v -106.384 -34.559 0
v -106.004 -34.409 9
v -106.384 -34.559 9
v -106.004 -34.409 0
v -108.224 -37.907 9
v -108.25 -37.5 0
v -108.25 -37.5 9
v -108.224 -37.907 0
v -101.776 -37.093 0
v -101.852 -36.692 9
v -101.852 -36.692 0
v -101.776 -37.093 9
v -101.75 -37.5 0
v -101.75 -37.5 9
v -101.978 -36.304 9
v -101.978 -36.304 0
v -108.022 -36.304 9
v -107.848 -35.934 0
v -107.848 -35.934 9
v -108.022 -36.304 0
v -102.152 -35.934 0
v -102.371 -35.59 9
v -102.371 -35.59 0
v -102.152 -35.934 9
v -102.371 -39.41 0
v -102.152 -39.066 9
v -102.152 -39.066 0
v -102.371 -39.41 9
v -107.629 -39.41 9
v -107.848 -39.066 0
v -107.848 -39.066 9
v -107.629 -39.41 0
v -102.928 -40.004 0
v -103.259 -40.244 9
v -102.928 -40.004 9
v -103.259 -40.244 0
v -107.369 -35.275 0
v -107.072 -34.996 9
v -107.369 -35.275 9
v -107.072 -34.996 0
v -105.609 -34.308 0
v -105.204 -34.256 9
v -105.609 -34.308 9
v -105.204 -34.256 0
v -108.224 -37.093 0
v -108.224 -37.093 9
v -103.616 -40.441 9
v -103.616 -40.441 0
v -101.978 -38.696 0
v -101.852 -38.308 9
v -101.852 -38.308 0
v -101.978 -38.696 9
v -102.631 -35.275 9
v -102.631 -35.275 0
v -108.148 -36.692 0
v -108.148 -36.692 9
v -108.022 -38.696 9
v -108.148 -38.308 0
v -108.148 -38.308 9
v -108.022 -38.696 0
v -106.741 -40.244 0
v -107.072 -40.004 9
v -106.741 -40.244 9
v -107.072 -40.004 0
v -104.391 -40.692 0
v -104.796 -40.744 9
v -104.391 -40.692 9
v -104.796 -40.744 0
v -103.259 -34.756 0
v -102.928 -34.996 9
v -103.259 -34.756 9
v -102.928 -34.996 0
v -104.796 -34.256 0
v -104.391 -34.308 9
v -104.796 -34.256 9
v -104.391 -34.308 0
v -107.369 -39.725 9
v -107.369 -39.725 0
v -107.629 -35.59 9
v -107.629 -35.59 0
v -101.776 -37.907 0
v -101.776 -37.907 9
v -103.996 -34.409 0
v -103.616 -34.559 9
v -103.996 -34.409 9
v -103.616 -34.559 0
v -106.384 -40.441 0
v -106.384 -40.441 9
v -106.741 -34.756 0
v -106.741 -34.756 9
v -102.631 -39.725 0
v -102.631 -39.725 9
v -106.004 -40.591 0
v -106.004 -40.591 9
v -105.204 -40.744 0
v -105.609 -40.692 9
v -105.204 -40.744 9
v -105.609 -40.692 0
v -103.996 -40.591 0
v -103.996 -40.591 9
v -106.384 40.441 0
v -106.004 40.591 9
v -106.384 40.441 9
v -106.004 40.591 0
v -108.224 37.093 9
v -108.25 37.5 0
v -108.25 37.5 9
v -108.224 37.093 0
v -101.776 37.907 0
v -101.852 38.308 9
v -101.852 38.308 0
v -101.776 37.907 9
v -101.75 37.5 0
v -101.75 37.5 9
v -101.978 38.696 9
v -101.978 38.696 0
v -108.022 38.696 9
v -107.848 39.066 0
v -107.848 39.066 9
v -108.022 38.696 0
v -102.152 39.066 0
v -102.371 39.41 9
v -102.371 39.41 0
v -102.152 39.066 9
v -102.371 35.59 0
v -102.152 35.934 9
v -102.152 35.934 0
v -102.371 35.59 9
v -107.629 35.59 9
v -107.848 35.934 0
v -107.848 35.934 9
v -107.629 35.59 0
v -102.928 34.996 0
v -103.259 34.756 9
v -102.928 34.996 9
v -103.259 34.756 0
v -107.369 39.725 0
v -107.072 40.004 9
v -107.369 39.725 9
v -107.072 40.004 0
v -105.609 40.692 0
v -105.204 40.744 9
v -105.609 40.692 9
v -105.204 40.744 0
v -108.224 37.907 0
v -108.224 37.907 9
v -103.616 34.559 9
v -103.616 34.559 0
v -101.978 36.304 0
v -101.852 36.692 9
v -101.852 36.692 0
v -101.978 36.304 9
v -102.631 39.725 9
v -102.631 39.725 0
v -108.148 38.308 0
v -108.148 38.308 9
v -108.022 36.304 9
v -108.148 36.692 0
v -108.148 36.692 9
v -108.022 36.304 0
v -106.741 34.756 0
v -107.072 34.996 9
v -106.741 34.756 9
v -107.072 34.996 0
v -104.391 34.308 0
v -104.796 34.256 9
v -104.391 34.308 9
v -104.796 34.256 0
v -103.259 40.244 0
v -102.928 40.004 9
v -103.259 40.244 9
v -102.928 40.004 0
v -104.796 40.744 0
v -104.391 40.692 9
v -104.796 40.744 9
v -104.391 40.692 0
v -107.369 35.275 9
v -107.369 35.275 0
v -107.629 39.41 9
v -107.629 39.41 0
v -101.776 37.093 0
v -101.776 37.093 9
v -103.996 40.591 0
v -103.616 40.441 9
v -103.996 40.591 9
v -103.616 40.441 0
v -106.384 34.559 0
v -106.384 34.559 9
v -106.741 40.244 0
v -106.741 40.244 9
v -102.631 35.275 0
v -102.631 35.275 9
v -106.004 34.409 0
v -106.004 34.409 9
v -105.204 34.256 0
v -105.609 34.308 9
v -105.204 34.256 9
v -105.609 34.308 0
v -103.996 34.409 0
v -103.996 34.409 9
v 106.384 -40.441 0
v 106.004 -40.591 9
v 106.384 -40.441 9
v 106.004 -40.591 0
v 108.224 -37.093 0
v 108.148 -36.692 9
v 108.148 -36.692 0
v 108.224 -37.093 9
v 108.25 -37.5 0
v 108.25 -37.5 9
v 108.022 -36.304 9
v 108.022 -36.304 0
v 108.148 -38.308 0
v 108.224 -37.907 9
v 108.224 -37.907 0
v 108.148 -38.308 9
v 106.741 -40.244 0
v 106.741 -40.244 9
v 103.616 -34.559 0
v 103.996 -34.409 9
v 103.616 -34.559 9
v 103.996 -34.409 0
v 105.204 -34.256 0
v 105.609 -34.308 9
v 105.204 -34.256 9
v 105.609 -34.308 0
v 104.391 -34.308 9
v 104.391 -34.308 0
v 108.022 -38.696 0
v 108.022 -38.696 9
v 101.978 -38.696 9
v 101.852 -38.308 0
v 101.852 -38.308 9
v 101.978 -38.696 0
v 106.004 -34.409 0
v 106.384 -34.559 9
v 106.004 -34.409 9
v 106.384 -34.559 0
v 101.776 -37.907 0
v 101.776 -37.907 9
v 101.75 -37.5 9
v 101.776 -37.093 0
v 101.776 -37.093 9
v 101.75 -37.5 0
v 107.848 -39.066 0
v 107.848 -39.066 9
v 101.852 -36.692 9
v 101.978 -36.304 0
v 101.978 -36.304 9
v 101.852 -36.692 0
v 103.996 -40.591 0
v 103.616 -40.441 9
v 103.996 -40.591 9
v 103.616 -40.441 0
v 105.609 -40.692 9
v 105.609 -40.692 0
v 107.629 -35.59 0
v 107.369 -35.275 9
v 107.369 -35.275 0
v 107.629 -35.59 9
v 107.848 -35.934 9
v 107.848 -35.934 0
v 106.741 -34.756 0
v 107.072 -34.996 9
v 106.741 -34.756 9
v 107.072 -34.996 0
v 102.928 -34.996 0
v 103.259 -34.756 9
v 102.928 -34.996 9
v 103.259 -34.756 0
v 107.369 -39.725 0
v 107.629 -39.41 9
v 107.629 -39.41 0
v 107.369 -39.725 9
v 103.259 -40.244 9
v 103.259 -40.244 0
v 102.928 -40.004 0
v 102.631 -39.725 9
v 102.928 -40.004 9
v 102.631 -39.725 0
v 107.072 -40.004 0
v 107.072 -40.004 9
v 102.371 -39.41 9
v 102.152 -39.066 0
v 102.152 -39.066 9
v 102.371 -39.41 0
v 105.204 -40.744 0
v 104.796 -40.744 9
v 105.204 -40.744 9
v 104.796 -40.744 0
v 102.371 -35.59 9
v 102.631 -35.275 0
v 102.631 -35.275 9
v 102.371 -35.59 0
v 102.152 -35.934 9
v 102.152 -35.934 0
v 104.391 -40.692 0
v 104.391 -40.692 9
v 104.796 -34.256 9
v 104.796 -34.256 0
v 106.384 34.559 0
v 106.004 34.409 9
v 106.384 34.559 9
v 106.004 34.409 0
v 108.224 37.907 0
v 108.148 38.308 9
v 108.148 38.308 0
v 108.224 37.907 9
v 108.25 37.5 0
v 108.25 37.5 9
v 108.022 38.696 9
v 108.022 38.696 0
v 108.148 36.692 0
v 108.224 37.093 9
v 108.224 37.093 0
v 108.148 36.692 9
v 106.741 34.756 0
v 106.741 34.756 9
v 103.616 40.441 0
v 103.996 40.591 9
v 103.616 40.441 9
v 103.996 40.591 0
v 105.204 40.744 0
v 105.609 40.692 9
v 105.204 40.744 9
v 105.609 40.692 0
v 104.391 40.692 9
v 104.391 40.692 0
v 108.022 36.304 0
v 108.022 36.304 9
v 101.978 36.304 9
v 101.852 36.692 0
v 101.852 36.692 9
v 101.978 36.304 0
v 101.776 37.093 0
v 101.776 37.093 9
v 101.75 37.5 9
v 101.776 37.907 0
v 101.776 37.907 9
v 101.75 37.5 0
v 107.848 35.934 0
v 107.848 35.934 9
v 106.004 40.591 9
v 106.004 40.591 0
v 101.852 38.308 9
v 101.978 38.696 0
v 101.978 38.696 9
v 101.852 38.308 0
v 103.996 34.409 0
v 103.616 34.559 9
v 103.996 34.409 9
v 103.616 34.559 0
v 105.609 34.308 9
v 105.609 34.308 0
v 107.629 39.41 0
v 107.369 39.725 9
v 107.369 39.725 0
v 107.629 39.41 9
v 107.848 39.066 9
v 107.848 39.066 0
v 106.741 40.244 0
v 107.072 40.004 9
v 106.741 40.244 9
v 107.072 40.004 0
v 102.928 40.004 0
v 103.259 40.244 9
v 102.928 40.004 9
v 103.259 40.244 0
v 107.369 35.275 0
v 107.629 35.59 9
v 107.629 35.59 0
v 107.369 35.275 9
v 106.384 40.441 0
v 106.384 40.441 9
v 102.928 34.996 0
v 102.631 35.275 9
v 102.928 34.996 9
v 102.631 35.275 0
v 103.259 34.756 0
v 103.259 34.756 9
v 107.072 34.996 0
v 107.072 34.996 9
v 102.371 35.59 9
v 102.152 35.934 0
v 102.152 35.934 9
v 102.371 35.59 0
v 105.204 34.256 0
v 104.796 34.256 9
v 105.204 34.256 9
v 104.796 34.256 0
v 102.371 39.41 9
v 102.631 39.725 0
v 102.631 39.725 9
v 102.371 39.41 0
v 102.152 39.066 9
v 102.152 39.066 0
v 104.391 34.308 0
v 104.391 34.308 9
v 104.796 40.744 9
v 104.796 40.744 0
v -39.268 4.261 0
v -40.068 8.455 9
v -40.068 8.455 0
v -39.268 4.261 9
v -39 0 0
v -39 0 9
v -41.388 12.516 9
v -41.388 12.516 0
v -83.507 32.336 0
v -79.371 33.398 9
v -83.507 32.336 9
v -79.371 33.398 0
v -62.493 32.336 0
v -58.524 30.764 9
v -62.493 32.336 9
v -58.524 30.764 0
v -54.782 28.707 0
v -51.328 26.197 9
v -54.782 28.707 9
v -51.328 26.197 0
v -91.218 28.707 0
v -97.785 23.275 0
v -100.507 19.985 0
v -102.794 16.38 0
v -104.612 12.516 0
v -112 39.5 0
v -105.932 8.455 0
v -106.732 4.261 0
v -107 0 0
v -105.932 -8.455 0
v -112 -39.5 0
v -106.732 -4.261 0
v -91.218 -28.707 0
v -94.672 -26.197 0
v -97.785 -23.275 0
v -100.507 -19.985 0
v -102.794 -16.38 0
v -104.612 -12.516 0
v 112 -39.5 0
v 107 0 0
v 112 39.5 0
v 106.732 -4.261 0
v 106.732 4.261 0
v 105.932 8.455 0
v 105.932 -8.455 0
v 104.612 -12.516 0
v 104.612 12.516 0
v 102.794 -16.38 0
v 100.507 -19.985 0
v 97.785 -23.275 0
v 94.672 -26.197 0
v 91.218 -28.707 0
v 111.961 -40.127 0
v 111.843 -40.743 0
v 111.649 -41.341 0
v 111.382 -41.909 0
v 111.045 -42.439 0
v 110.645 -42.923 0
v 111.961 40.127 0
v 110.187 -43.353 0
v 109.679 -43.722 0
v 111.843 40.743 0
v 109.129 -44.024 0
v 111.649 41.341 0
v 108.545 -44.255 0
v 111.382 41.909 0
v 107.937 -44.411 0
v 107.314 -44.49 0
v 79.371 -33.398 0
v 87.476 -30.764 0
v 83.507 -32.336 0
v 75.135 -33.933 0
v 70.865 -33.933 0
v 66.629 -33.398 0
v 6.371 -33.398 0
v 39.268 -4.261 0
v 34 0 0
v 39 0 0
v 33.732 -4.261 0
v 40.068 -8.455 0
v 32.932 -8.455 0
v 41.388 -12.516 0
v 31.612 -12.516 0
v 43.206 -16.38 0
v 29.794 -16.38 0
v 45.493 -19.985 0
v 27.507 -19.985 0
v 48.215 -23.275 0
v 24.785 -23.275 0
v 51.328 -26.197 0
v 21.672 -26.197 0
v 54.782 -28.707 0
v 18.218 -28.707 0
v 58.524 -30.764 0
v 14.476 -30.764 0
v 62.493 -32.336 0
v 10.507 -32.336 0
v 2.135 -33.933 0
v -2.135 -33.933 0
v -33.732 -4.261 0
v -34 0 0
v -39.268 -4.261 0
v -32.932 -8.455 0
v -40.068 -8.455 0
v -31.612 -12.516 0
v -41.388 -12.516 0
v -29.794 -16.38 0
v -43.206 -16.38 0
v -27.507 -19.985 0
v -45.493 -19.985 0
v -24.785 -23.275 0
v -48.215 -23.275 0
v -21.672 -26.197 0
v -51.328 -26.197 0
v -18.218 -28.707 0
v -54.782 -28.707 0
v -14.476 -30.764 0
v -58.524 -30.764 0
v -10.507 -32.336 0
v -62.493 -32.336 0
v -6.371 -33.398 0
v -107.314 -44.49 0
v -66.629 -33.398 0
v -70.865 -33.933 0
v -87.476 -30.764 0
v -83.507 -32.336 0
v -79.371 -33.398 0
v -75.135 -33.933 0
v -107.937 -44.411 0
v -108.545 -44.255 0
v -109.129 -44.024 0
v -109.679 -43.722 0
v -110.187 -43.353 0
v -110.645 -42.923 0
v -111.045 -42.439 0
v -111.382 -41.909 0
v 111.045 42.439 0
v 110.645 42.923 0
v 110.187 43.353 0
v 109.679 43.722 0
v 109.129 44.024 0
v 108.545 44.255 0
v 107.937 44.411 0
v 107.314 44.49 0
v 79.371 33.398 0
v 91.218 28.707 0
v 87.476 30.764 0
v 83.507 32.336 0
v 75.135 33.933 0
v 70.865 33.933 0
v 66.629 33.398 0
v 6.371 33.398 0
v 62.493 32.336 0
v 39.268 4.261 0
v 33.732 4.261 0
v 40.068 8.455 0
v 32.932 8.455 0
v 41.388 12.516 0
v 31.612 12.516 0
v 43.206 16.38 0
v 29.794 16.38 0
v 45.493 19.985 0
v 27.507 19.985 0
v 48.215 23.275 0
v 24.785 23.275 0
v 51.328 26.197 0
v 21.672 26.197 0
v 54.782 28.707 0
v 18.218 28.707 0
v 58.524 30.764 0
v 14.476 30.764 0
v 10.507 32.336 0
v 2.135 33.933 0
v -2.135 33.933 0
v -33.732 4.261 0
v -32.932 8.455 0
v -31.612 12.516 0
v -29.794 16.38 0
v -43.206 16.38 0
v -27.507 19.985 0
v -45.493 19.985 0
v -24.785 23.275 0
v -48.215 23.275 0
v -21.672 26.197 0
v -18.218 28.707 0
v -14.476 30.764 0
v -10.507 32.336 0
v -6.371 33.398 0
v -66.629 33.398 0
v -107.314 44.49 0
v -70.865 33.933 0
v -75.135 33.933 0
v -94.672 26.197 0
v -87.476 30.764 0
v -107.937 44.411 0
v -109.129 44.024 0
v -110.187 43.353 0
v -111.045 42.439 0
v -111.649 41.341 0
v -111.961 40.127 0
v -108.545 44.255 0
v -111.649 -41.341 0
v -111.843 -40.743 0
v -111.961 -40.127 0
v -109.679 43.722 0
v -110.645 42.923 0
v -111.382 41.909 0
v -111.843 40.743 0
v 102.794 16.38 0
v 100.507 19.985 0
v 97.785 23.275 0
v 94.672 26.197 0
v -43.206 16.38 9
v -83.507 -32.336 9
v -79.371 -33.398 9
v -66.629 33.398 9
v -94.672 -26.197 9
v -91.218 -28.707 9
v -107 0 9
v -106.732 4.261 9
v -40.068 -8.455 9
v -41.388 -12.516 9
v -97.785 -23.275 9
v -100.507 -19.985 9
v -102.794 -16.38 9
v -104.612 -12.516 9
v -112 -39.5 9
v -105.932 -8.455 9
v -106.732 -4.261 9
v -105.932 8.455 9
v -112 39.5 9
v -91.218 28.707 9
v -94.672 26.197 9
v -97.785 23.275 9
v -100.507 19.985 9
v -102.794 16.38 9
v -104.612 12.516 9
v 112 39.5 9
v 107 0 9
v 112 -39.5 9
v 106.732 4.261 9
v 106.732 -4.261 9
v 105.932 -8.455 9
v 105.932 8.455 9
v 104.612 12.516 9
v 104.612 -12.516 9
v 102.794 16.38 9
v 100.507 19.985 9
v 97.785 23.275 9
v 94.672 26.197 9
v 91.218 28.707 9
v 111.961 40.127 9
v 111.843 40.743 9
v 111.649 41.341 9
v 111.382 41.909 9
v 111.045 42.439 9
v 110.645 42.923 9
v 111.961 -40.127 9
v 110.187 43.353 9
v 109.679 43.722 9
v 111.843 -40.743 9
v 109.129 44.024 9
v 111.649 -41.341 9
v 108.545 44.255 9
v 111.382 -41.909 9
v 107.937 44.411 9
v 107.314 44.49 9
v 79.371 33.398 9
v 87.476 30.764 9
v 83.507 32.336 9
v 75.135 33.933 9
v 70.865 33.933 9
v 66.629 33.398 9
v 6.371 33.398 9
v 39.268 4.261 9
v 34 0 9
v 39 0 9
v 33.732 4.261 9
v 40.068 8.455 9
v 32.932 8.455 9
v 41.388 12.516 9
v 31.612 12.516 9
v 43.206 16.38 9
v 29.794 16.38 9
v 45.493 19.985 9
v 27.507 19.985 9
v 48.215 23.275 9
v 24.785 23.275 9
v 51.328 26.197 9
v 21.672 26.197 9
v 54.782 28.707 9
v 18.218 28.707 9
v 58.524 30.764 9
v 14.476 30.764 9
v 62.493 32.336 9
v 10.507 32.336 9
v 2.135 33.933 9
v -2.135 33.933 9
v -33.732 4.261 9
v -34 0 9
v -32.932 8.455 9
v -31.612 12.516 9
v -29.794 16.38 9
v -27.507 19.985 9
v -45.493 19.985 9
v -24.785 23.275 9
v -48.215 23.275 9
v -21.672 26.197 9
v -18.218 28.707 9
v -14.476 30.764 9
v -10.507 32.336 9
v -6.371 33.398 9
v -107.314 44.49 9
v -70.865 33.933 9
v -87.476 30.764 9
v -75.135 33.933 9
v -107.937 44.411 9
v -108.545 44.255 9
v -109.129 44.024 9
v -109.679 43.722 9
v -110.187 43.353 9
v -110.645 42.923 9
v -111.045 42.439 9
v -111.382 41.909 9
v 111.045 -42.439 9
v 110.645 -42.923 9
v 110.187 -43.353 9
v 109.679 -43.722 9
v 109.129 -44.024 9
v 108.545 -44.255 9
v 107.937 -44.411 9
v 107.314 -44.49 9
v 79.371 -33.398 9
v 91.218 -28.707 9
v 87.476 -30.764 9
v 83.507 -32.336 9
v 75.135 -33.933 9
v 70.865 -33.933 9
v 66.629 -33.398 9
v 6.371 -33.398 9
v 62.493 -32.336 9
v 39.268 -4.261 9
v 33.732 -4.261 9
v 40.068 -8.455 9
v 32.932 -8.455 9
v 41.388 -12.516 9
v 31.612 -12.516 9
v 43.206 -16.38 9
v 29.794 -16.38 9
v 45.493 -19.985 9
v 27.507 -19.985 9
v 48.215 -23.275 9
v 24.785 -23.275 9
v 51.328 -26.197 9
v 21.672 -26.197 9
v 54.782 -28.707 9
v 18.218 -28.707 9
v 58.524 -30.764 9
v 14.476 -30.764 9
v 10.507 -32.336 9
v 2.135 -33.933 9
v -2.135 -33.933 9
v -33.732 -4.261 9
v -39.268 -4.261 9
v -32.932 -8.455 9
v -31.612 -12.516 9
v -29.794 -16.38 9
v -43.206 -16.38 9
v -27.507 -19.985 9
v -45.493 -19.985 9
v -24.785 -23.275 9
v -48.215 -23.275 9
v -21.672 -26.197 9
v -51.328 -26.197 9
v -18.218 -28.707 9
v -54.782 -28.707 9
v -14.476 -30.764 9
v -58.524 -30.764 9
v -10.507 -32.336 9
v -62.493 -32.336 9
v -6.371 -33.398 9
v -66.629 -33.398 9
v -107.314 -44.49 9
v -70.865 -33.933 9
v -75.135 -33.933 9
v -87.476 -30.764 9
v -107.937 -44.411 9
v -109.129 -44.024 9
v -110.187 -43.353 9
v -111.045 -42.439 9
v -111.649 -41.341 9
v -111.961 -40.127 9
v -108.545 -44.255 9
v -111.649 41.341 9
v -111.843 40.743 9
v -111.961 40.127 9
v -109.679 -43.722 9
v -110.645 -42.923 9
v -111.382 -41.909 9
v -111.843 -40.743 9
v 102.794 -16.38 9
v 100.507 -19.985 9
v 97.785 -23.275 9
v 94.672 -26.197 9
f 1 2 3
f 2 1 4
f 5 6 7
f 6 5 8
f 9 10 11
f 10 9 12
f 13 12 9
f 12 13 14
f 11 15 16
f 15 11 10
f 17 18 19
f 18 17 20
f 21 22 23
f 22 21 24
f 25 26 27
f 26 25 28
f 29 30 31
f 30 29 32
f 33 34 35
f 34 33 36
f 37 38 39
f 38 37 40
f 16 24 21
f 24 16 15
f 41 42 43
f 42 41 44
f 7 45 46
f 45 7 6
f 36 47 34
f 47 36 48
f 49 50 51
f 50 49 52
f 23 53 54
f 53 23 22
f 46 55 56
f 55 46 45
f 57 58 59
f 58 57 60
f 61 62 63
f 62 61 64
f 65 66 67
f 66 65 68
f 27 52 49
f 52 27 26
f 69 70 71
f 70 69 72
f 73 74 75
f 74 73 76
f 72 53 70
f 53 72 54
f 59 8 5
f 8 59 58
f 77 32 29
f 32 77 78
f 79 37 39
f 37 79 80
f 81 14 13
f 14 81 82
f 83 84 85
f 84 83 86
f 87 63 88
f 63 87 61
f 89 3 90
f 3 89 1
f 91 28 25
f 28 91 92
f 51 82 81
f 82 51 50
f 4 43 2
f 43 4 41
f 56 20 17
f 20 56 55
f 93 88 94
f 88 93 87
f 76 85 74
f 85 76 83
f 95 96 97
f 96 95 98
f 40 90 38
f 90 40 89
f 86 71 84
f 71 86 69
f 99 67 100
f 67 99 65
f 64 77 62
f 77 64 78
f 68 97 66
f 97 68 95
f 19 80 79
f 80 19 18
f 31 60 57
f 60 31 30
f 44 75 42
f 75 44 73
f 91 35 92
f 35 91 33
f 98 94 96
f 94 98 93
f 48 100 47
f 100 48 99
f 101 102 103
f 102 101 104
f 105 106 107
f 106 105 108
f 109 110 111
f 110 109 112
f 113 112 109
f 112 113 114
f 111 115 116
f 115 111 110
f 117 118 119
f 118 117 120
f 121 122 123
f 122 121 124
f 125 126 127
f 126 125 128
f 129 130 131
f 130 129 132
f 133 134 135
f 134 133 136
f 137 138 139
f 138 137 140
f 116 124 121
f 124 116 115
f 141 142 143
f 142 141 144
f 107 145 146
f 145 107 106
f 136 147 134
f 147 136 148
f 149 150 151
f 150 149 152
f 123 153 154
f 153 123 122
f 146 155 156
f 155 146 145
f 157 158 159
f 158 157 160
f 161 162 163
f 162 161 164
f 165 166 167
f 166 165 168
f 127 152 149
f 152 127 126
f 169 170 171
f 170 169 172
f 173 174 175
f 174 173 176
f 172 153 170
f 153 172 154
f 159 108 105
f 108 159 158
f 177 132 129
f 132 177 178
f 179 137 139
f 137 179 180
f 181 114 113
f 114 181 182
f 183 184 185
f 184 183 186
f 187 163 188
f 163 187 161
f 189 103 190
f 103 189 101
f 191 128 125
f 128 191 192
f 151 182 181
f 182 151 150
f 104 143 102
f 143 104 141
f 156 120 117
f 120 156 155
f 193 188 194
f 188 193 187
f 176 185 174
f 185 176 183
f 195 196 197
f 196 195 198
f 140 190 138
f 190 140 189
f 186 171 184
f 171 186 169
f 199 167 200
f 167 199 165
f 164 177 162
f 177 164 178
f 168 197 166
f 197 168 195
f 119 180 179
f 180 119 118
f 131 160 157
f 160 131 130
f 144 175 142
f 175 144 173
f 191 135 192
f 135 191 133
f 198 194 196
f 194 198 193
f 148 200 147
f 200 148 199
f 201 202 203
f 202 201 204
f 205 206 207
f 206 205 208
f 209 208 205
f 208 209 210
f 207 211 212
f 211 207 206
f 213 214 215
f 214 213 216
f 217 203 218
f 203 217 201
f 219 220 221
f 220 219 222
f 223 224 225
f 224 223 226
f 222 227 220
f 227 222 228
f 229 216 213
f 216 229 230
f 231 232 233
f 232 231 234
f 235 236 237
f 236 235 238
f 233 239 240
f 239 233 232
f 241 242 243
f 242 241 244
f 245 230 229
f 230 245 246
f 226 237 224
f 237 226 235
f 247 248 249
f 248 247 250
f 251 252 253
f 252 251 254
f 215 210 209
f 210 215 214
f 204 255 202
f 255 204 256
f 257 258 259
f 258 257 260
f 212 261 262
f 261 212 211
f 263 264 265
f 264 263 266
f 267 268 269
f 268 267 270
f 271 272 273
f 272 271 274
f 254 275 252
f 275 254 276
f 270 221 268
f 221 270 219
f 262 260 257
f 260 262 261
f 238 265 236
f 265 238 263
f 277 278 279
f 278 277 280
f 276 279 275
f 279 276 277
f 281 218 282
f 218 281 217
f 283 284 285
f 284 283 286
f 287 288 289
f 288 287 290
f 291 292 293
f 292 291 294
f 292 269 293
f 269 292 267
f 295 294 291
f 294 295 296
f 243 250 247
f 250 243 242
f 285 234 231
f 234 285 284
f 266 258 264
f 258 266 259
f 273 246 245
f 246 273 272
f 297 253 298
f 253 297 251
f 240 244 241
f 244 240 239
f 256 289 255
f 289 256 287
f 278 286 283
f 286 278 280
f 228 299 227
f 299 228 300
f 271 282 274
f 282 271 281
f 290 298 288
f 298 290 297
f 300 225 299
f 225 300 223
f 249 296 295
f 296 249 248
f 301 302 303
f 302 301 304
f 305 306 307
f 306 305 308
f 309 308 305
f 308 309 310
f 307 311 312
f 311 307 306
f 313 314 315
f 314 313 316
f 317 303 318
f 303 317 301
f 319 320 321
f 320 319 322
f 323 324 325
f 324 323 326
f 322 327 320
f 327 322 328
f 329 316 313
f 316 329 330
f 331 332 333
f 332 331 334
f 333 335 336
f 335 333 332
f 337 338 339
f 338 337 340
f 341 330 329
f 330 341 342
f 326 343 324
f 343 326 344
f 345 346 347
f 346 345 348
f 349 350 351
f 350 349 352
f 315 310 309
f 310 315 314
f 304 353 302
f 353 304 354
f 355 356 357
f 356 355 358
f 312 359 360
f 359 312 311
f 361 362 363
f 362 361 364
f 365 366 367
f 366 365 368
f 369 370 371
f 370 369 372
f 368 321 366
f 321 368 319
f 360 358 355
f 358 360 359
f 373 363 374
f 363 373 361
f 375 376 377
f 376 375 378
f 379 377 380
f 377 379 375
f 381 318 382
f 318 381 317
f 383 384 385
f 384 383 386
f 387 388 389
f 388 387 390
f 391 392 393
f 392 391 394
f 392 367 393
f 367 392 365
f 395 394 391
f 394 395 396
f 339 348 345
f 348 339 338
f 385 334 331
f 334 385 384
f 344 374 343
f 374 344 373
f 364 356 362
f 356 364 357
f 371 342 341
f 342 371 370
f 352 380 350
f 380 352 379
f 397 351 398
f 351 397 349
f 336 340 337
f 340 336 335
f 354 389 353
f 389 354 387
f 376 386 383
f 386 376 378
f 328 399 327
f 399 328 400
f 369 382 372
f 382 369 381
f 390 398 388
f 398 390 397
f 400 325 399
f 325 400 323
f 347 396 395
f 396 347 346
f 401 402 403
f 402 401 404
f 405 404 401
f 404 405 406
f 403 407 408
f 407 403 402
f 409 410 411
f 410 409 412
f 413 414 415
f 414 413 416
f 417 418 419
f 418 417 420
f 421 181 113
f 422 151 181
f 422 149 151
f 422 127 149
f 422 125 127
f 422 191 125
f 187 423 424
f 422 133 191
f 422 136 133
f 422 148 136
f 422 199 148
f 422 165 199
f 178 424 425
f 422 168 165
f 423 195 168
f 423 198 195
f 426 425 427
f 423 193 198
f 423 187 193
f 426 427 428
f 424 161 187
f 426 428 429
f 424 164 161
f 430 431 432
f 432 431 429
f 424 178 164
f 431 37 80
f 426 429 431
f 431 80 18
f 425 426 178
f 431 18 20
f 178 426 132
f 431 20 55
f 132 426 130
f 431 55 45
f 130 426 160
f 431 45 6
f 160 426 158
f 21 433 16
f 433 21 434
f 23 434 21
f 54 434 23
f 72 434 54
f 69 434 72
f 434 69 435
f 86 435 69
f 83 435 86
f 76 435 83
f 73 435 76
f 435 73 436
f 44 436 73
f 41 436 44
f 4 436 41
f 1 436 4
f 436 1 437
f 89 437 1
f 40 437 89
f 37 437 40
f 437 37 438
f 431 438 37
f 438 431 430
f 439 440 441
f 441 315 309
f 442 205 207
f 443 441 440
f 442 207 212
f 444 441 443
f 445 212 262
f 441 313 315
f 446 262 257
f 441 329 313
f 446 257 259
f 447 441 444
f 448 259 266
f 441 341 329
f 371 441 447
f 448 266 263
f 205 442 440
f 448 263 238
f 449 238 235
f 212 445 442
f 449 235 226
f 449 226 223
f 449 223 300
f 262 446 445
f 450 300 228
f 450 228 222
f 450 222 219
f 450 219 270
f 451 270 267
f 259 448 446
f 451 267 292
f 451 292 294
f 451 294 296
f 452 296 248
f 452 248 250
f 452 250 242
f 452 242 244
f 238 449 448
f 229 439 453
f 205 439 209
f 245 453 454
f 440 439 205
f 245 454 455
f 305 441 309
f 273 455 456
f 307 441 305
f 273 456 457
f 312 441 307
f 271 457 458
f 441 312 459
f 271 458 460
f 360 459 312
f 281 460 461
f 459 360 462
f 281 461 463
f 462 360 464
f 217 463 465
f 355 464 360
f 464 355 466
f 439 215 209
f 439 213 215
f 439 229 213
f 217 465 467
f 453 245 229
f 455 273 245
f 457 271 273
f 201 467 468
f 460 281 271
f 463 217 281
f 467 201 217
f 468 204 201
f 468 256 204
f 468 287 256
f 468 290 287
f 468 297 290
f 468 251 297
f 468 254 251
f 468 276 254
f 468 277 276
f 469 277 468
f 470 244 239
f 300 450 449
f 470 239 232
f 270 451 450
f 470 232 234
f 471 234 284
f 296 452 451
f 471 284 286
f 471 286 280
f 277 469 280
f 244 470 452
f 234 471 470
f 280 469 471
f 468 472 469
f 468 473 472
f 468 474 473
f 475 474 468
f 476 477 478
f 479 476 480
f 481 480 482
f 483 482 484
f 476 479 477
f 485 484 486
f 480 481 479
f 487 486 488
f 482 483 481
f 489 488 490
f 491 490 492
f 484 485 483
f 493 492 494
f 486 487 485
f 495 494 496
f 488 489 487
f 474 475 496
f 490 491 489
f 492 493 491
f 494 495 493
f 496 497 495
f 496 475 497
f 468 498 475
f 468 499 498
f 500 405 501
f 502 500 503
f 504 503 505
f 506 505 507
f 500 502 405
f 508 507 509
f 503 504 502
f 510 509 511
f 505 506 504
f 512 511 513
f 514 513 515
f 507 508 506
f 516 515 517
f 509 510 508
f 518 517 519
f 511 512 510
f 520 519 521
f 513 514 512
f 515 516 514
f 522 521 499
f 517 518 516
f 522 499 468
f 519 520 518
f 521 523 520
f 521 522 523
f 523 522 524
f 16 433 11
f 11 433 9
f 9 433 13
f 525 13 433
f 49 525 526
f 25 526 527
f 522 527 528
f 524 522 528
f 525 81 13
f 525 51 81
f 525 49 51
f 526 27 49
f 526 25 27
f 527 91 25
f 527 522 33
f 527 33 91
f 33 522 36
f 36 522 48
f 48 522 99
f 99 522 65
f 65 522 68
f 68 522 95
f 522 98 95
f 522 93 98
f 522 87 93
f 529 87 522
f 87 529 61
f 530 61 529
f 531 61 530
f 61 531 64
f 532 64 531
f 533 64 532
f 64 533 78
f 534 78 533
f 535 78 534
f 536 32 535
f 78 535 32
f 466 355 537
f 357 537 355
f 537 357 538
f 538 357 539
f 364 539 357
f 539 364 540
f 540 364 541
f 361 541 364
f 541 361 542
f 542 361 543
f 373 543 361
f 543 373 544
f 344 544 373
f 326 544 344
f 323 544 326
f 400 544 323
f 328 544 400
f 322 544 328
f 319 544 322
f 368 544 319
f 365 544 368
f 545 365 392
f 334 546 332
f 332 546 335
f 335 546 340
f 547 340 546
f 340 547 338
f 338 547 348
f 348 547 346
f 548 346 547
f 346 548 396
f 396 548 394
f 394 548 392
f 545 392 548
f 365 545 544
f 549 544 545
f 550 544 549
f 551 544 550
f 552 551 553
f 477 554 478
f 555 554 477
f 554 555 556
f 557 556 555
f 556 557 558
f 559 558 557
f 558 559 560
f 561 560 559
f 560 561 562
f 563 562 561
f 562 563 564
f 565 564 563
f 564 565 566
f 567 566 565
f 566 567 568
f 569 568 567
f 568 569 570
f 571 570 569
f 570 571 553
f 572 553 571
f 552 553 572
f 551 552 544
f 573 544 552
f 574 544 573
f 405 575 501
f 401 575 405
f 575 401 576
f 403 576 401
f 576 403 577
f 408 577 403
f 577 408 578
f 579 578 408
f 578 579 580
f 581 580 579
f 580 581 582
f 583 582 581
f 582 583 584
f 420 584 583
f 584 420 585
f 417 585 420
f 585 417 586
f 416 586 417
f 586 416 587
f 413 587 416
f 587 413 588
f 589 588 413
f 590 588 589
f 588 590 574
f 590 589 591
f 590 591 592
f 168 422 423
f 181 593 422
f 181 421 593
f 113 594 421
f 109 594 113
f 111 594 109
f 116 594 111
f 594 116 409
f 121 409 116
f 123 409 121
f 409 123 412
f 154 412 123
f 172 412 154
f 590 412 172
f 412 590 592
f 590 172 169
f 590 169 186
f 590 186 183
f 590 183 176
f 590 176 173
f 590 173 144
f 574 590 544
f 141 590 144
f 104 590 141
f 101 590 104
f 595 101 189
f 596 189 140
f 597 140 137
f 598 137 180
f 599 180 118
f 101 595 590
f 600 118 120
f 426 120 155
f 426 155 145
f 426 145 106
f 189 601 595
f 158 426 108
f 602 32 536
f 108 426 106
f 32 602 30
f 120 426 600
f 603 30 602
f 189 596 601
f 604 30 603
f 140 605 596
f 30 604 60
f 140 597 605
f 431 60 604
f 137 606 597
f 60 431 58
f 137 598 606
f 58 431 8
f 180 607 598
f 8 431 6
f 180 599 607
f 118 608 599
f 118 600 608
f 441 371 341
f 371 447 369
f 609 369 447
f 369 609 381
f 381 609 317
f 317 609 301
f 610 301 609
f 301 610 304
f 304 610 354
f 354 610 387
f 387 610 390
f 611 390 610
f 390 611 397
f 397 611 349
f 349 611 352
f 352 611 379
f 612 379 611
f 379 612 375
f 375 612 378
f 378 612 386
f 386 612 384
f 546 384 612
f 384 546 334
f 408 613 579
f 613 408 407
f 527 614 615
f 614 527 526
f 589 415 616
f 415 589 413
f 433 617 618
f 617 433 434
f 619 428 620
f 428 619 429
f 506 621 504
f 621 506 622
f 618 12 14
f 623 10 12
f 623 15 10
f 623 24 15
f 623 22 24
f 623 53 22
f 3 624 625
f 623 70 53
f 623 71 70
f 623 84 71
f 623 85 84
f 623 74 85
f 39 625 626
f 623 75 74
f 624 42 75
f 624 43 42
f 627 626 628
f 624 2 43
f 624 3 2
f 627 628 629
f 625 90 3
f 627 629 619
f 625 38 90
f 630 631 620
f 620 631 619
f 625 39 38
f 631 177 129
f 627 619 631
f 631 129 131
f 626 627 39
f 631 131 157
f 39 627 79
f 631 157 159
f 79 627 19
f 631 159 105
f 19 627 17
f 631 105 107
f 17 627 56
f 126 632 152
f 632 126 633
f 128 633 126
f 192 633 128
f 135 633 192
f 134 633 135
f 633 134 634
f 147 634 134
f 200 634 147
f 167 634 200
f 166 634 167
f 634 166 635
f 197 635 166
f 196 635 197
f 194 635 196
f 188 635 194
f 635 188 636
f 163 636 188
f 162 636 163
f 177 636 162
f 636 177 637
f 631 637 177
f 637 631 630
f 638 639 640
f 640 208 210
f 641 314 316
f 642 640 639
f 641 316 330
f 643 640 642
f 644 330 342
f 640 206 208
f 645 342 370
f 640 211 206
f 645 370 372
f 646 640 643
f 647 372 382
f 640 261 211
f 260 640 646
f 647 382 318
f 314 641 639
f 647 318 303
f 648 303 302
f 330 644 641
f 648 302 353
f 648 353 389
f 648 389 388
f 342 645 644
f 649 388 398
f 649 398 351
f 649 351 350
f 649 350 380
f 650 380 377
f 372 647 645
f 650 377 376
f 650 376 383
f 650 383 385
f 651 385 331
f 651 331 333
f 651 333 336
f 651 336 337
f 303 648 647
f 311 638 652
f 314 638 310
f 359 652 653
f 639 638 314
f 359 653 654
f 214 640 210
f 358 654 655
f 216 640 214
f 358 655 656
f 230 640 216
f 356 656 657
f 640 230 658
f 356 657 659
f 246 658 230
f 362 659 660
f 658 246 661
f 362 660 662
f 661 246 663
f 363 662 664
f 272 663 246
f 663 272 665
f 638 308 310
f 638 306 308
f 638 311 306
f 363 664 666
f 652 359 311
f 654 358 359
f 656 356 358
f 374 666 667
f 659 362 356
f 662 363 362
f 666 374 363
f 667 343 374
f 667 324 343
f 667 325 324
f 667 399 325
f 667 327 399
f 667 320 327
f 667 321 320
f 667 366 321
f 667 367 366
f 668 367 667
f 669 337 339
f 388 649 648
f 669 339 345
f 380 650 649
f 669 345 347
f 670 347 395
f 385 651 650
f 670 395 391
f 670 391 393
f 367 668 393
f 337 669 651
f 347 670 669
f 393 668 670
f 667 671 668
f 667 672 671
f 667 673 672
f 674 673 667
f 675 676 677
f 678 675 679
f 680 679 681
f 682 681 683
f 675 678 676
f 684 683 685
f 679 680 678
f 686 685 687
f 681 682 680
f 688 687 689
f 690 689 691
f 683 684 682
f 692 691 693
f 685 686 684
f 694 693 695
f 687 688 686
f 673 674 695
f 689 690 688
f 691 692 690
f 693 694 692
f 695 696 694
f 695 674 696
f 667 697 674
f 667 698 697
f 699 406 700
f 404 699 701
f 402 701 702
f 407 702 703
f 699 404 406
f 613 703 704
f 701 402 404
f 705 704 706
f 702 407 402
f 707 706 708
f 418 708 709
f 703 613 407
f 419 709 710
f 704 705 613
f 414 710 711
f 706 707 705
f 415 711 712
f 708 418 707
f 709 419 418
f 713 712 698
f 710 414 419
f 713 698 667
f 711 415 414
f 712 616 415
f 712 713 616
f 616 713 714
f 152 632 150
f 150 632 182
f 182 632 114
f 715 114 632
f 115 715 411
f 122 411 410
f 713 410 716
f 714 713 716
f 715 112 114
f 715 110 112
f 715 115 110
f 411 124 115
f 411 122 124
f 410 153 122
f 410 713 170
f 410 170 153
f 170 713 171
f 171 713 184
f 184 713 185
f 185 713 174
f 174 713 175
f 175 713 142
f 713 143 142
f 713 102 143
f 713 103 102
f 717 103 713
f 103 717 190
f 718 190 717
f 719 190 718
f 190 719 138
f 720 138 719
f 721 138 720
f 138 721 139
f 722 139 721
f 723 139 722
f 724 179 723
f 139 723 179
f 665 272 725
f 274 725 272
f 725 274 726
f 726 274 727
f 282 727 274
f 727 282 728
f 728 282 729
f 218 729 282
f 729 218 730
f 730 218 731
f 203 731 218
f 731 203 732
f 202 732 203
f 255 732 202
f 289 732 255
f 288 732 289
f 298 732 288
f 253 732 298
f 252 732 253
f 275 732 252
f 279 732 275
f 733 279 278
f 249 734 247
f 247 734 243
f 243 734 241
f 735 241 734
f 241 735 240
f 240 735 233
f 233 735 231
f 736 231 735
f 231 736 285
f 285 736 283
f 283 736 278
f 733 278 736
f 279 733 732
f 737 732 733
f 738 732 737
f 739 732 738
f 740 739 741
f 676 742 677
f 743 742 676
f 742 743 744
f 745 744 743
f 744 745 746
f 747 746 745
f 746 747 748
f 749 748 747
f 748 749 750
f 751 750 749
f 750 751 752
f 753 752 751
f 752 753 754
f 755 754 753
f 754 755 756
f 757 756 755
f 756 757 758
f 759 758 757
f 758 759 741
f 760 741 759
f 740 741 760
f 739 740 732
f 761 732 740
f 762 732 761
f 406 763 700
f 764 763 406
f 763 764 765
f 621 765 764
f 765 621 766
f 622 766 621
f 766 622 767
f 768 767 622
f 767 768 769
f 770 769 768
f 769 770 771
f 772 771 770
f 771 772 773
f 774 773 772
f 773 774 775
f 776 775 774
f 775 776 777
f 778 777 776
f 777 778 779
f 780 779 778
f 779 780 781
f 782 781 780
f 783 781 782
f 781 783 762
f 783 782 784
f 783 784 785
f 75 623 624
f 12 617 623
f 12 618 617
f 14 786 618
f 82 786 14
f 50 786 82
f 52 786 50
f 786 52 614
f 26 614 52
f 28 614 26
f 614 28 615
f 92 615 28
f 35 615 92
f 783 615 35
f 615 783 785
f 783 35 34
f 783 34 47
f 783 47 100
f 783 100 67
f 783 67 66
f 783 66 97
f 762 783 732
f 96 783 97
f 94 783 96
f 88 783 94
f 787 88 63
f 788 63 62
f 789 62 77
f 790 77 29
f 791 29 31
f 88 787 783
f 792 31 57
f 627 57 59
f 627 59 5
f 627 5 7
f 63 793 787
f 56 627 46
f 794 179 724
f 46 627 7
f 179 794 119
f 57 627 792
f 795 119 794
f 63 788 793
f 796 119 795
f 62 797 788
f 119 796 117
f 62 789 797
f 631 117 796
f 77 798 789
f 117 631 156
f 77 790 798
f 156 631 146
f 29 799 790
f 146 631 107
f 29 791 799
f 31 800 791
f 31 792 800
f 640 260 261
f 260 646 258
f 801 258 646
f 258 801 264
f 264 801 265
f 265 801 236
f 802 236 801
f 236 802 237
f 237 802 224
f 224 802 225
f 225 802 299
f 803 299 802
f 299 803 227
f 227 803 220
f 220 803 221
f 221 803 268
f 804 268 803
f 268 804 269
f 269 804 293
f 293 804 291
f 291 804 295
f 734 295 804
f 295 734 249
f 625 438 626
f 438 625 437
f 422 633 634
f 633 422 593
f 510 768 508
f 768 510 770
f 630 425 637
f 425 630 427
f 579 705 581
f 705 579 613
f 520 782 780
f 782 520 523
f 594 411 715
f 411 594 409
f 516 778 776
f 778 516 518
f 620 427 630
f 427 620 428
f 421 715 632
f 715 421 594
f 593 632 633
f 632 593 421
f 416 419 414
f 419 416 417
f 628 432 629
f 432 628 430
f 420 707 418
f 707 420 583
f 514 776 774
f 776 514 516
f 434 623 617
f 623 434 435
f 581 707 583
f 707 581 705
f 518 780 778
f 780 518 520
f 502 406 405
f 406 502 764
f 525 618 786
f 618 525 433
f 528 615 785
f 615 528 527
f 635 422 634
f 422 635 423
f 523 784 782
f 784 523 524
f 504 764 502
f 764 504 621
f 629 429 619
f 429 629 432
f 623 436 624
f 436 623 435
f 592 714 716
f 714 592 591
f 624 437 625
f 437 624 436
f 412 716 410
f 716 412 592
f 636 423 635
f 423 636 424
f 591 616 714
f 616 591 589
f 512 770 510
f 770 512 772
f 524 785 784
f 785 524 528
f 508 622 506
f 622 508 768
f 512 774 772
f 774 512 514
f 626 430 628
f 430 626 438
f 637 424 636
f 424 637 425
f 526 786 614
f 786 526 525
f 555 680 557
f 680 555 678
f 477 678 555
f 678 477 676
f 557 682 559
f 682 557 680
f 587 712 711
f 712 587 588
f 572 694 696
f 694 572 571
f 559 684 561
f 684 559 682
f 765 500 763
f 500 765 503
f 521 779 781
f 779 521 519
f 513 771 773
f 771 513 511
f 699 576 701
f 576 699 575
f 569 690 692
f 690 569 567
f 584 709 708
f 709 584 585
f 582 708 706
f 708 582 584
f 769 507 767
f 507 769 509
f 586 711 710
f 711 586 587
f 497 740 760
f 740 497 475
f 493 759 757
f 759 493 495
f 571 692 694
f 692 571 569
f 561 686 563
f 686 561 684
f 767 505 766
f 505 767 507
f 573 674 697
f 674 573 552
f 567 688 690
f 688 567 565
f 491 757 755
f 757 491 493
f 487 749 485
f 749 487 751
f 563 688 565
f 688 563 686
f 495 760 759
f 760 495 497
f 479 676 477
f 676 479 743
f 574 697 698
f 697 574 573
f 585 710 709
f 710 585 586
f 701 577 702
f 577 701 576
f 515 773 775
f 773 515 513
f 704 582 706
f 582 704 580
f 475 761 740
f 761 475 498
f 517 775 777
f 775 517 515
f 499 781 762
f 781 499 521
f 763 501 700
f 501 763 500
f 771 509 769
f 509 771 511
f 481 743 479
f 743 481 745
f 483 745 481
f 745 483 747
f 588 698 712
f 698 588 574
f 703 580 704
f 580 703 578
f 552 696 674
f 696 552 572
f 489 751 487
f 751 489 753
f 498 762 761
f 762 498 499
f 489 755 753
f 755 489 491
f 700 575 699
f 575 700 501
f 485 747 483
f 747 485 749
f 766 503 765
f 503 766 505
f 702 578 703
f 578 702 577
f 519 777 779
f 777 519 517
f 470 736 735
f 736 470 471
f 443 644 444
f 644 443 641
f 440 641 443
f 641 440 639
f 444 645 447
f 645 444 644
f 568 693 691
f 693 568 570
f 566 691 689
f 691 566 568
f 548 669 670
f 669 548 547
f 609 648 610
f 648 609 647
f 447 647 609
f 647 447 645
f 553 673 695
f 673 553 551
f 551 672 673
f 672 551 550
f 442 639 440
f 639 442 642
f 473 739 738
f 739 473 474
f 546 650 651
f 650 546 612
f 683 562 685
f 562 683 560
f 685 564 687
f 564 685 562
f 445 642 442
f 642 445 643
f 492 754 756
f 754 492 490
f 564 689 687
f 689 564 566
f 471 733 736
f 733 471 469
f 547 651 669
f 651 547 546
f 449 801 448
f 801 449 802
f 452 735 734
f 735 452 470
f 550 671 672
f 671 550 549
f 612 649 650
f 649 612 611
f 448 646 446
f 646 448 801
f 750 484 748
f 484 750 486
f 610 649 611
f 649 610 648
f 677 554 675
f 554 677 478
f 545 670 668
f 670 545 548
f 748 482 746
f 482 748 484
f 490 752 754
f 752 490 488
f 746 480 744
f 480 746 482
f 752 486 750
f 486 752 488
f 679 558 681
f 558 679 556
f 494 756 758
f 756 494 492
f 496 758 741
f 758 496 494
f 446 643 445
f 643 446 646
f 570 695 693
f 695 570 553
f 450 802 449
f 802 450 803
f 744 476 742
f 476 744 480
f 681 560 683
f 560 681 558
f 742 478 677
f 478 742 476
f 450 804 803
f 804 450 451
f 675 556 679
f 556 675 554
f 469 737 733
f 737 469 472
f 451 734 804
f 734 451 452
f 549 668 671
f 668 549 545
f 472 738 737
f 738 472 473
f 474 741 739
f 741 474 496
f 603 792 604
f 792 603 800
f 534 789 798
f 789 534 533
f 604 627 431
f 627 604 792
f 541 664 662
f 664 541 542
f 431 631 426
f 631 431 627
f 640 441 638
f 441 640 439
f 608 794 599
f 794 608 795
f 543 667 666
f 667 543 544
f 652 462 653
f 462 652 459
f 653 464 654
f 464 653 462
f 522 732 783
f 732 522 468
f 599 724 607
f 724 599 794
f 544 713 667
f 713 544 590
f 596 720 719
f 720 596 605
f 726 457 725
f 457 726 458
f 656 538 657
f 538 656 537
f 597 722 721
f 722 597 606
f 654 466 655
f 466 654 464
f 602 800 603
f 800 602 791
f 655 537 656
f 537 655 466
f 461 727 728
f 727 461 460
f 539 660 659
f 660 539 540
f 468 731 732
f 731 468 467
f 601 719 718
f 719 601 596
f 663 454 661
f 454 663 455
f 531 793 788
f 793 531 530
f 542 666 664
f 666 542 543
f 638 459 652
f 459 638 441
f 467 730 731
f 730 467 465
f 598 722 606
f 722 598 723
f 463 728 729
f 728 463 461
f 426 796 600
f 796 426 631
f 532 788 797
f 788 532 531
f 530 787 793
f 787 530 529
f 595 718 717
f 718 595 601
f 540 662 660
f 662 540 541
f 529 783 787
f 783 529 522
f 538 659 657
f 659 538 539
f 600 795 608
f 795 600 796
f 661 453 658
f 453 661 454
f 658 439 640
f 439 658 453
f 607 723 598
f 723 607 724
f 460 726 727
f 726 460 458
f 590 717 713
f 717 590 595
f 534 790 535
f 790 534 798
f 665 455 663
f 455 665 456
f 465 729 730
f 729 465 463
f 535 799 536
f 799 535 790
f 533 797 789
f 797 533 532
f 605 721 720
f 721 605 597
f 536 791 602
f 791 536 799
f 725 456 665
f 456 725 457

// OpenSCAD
$fn = 50;


difference() {
	union() {
		hull() {
			translate(v = [-107.0000000000, 39.5000000000, 0]) {
				cylinder(h = 9, r = 5);
			}
			translate(v = [107.0000000000, 39.5000000000, 0]) {
				cylinder(h = 9, r = 5);
			}
			translate(v = [-107.0000000000, -39.5000000000, 0]) {
				cylinder(h = 9, r = 5);
			}
			translate(v = [107.0000000000, -39.5000000000, 0]) {
				cylinder(h = 9, r = 5);
			}
		}
	}
	union() {
		#translate(v = [-105.0000000000, -37.5000000000, -100.0000000000]) {
			cylinder(h = 200, r = 3.2500000000);
		}
		#translate(v = [-105.0000000000, 37.5000000000, -100.0000000000]) {
			cylinder(h = 200, r = 3.2500000000);
		}
		#translate(v = [105.0000000000, -37.5000000000, -100.0000000000]) {
			cylinder(h = 200, r = 3.2500000000);
		}
		#translate(v = [105.0000000000, 37.5000000000, -100.0000000000]) {
			cylinder(h = 200, r = 3.2500000000);
		}
		#translate(v = [-73.0000000000, 0, 0]) {
			cylinder(h = 9, r = 34.0000000000);
		}
		#cylinder(h = 9, r = 34.0000000000);
		#translate(v = [73.0000000000, 0, 0]) {
			cylinder(h = 9, r = 34.0000000000);
		}
	}
}
